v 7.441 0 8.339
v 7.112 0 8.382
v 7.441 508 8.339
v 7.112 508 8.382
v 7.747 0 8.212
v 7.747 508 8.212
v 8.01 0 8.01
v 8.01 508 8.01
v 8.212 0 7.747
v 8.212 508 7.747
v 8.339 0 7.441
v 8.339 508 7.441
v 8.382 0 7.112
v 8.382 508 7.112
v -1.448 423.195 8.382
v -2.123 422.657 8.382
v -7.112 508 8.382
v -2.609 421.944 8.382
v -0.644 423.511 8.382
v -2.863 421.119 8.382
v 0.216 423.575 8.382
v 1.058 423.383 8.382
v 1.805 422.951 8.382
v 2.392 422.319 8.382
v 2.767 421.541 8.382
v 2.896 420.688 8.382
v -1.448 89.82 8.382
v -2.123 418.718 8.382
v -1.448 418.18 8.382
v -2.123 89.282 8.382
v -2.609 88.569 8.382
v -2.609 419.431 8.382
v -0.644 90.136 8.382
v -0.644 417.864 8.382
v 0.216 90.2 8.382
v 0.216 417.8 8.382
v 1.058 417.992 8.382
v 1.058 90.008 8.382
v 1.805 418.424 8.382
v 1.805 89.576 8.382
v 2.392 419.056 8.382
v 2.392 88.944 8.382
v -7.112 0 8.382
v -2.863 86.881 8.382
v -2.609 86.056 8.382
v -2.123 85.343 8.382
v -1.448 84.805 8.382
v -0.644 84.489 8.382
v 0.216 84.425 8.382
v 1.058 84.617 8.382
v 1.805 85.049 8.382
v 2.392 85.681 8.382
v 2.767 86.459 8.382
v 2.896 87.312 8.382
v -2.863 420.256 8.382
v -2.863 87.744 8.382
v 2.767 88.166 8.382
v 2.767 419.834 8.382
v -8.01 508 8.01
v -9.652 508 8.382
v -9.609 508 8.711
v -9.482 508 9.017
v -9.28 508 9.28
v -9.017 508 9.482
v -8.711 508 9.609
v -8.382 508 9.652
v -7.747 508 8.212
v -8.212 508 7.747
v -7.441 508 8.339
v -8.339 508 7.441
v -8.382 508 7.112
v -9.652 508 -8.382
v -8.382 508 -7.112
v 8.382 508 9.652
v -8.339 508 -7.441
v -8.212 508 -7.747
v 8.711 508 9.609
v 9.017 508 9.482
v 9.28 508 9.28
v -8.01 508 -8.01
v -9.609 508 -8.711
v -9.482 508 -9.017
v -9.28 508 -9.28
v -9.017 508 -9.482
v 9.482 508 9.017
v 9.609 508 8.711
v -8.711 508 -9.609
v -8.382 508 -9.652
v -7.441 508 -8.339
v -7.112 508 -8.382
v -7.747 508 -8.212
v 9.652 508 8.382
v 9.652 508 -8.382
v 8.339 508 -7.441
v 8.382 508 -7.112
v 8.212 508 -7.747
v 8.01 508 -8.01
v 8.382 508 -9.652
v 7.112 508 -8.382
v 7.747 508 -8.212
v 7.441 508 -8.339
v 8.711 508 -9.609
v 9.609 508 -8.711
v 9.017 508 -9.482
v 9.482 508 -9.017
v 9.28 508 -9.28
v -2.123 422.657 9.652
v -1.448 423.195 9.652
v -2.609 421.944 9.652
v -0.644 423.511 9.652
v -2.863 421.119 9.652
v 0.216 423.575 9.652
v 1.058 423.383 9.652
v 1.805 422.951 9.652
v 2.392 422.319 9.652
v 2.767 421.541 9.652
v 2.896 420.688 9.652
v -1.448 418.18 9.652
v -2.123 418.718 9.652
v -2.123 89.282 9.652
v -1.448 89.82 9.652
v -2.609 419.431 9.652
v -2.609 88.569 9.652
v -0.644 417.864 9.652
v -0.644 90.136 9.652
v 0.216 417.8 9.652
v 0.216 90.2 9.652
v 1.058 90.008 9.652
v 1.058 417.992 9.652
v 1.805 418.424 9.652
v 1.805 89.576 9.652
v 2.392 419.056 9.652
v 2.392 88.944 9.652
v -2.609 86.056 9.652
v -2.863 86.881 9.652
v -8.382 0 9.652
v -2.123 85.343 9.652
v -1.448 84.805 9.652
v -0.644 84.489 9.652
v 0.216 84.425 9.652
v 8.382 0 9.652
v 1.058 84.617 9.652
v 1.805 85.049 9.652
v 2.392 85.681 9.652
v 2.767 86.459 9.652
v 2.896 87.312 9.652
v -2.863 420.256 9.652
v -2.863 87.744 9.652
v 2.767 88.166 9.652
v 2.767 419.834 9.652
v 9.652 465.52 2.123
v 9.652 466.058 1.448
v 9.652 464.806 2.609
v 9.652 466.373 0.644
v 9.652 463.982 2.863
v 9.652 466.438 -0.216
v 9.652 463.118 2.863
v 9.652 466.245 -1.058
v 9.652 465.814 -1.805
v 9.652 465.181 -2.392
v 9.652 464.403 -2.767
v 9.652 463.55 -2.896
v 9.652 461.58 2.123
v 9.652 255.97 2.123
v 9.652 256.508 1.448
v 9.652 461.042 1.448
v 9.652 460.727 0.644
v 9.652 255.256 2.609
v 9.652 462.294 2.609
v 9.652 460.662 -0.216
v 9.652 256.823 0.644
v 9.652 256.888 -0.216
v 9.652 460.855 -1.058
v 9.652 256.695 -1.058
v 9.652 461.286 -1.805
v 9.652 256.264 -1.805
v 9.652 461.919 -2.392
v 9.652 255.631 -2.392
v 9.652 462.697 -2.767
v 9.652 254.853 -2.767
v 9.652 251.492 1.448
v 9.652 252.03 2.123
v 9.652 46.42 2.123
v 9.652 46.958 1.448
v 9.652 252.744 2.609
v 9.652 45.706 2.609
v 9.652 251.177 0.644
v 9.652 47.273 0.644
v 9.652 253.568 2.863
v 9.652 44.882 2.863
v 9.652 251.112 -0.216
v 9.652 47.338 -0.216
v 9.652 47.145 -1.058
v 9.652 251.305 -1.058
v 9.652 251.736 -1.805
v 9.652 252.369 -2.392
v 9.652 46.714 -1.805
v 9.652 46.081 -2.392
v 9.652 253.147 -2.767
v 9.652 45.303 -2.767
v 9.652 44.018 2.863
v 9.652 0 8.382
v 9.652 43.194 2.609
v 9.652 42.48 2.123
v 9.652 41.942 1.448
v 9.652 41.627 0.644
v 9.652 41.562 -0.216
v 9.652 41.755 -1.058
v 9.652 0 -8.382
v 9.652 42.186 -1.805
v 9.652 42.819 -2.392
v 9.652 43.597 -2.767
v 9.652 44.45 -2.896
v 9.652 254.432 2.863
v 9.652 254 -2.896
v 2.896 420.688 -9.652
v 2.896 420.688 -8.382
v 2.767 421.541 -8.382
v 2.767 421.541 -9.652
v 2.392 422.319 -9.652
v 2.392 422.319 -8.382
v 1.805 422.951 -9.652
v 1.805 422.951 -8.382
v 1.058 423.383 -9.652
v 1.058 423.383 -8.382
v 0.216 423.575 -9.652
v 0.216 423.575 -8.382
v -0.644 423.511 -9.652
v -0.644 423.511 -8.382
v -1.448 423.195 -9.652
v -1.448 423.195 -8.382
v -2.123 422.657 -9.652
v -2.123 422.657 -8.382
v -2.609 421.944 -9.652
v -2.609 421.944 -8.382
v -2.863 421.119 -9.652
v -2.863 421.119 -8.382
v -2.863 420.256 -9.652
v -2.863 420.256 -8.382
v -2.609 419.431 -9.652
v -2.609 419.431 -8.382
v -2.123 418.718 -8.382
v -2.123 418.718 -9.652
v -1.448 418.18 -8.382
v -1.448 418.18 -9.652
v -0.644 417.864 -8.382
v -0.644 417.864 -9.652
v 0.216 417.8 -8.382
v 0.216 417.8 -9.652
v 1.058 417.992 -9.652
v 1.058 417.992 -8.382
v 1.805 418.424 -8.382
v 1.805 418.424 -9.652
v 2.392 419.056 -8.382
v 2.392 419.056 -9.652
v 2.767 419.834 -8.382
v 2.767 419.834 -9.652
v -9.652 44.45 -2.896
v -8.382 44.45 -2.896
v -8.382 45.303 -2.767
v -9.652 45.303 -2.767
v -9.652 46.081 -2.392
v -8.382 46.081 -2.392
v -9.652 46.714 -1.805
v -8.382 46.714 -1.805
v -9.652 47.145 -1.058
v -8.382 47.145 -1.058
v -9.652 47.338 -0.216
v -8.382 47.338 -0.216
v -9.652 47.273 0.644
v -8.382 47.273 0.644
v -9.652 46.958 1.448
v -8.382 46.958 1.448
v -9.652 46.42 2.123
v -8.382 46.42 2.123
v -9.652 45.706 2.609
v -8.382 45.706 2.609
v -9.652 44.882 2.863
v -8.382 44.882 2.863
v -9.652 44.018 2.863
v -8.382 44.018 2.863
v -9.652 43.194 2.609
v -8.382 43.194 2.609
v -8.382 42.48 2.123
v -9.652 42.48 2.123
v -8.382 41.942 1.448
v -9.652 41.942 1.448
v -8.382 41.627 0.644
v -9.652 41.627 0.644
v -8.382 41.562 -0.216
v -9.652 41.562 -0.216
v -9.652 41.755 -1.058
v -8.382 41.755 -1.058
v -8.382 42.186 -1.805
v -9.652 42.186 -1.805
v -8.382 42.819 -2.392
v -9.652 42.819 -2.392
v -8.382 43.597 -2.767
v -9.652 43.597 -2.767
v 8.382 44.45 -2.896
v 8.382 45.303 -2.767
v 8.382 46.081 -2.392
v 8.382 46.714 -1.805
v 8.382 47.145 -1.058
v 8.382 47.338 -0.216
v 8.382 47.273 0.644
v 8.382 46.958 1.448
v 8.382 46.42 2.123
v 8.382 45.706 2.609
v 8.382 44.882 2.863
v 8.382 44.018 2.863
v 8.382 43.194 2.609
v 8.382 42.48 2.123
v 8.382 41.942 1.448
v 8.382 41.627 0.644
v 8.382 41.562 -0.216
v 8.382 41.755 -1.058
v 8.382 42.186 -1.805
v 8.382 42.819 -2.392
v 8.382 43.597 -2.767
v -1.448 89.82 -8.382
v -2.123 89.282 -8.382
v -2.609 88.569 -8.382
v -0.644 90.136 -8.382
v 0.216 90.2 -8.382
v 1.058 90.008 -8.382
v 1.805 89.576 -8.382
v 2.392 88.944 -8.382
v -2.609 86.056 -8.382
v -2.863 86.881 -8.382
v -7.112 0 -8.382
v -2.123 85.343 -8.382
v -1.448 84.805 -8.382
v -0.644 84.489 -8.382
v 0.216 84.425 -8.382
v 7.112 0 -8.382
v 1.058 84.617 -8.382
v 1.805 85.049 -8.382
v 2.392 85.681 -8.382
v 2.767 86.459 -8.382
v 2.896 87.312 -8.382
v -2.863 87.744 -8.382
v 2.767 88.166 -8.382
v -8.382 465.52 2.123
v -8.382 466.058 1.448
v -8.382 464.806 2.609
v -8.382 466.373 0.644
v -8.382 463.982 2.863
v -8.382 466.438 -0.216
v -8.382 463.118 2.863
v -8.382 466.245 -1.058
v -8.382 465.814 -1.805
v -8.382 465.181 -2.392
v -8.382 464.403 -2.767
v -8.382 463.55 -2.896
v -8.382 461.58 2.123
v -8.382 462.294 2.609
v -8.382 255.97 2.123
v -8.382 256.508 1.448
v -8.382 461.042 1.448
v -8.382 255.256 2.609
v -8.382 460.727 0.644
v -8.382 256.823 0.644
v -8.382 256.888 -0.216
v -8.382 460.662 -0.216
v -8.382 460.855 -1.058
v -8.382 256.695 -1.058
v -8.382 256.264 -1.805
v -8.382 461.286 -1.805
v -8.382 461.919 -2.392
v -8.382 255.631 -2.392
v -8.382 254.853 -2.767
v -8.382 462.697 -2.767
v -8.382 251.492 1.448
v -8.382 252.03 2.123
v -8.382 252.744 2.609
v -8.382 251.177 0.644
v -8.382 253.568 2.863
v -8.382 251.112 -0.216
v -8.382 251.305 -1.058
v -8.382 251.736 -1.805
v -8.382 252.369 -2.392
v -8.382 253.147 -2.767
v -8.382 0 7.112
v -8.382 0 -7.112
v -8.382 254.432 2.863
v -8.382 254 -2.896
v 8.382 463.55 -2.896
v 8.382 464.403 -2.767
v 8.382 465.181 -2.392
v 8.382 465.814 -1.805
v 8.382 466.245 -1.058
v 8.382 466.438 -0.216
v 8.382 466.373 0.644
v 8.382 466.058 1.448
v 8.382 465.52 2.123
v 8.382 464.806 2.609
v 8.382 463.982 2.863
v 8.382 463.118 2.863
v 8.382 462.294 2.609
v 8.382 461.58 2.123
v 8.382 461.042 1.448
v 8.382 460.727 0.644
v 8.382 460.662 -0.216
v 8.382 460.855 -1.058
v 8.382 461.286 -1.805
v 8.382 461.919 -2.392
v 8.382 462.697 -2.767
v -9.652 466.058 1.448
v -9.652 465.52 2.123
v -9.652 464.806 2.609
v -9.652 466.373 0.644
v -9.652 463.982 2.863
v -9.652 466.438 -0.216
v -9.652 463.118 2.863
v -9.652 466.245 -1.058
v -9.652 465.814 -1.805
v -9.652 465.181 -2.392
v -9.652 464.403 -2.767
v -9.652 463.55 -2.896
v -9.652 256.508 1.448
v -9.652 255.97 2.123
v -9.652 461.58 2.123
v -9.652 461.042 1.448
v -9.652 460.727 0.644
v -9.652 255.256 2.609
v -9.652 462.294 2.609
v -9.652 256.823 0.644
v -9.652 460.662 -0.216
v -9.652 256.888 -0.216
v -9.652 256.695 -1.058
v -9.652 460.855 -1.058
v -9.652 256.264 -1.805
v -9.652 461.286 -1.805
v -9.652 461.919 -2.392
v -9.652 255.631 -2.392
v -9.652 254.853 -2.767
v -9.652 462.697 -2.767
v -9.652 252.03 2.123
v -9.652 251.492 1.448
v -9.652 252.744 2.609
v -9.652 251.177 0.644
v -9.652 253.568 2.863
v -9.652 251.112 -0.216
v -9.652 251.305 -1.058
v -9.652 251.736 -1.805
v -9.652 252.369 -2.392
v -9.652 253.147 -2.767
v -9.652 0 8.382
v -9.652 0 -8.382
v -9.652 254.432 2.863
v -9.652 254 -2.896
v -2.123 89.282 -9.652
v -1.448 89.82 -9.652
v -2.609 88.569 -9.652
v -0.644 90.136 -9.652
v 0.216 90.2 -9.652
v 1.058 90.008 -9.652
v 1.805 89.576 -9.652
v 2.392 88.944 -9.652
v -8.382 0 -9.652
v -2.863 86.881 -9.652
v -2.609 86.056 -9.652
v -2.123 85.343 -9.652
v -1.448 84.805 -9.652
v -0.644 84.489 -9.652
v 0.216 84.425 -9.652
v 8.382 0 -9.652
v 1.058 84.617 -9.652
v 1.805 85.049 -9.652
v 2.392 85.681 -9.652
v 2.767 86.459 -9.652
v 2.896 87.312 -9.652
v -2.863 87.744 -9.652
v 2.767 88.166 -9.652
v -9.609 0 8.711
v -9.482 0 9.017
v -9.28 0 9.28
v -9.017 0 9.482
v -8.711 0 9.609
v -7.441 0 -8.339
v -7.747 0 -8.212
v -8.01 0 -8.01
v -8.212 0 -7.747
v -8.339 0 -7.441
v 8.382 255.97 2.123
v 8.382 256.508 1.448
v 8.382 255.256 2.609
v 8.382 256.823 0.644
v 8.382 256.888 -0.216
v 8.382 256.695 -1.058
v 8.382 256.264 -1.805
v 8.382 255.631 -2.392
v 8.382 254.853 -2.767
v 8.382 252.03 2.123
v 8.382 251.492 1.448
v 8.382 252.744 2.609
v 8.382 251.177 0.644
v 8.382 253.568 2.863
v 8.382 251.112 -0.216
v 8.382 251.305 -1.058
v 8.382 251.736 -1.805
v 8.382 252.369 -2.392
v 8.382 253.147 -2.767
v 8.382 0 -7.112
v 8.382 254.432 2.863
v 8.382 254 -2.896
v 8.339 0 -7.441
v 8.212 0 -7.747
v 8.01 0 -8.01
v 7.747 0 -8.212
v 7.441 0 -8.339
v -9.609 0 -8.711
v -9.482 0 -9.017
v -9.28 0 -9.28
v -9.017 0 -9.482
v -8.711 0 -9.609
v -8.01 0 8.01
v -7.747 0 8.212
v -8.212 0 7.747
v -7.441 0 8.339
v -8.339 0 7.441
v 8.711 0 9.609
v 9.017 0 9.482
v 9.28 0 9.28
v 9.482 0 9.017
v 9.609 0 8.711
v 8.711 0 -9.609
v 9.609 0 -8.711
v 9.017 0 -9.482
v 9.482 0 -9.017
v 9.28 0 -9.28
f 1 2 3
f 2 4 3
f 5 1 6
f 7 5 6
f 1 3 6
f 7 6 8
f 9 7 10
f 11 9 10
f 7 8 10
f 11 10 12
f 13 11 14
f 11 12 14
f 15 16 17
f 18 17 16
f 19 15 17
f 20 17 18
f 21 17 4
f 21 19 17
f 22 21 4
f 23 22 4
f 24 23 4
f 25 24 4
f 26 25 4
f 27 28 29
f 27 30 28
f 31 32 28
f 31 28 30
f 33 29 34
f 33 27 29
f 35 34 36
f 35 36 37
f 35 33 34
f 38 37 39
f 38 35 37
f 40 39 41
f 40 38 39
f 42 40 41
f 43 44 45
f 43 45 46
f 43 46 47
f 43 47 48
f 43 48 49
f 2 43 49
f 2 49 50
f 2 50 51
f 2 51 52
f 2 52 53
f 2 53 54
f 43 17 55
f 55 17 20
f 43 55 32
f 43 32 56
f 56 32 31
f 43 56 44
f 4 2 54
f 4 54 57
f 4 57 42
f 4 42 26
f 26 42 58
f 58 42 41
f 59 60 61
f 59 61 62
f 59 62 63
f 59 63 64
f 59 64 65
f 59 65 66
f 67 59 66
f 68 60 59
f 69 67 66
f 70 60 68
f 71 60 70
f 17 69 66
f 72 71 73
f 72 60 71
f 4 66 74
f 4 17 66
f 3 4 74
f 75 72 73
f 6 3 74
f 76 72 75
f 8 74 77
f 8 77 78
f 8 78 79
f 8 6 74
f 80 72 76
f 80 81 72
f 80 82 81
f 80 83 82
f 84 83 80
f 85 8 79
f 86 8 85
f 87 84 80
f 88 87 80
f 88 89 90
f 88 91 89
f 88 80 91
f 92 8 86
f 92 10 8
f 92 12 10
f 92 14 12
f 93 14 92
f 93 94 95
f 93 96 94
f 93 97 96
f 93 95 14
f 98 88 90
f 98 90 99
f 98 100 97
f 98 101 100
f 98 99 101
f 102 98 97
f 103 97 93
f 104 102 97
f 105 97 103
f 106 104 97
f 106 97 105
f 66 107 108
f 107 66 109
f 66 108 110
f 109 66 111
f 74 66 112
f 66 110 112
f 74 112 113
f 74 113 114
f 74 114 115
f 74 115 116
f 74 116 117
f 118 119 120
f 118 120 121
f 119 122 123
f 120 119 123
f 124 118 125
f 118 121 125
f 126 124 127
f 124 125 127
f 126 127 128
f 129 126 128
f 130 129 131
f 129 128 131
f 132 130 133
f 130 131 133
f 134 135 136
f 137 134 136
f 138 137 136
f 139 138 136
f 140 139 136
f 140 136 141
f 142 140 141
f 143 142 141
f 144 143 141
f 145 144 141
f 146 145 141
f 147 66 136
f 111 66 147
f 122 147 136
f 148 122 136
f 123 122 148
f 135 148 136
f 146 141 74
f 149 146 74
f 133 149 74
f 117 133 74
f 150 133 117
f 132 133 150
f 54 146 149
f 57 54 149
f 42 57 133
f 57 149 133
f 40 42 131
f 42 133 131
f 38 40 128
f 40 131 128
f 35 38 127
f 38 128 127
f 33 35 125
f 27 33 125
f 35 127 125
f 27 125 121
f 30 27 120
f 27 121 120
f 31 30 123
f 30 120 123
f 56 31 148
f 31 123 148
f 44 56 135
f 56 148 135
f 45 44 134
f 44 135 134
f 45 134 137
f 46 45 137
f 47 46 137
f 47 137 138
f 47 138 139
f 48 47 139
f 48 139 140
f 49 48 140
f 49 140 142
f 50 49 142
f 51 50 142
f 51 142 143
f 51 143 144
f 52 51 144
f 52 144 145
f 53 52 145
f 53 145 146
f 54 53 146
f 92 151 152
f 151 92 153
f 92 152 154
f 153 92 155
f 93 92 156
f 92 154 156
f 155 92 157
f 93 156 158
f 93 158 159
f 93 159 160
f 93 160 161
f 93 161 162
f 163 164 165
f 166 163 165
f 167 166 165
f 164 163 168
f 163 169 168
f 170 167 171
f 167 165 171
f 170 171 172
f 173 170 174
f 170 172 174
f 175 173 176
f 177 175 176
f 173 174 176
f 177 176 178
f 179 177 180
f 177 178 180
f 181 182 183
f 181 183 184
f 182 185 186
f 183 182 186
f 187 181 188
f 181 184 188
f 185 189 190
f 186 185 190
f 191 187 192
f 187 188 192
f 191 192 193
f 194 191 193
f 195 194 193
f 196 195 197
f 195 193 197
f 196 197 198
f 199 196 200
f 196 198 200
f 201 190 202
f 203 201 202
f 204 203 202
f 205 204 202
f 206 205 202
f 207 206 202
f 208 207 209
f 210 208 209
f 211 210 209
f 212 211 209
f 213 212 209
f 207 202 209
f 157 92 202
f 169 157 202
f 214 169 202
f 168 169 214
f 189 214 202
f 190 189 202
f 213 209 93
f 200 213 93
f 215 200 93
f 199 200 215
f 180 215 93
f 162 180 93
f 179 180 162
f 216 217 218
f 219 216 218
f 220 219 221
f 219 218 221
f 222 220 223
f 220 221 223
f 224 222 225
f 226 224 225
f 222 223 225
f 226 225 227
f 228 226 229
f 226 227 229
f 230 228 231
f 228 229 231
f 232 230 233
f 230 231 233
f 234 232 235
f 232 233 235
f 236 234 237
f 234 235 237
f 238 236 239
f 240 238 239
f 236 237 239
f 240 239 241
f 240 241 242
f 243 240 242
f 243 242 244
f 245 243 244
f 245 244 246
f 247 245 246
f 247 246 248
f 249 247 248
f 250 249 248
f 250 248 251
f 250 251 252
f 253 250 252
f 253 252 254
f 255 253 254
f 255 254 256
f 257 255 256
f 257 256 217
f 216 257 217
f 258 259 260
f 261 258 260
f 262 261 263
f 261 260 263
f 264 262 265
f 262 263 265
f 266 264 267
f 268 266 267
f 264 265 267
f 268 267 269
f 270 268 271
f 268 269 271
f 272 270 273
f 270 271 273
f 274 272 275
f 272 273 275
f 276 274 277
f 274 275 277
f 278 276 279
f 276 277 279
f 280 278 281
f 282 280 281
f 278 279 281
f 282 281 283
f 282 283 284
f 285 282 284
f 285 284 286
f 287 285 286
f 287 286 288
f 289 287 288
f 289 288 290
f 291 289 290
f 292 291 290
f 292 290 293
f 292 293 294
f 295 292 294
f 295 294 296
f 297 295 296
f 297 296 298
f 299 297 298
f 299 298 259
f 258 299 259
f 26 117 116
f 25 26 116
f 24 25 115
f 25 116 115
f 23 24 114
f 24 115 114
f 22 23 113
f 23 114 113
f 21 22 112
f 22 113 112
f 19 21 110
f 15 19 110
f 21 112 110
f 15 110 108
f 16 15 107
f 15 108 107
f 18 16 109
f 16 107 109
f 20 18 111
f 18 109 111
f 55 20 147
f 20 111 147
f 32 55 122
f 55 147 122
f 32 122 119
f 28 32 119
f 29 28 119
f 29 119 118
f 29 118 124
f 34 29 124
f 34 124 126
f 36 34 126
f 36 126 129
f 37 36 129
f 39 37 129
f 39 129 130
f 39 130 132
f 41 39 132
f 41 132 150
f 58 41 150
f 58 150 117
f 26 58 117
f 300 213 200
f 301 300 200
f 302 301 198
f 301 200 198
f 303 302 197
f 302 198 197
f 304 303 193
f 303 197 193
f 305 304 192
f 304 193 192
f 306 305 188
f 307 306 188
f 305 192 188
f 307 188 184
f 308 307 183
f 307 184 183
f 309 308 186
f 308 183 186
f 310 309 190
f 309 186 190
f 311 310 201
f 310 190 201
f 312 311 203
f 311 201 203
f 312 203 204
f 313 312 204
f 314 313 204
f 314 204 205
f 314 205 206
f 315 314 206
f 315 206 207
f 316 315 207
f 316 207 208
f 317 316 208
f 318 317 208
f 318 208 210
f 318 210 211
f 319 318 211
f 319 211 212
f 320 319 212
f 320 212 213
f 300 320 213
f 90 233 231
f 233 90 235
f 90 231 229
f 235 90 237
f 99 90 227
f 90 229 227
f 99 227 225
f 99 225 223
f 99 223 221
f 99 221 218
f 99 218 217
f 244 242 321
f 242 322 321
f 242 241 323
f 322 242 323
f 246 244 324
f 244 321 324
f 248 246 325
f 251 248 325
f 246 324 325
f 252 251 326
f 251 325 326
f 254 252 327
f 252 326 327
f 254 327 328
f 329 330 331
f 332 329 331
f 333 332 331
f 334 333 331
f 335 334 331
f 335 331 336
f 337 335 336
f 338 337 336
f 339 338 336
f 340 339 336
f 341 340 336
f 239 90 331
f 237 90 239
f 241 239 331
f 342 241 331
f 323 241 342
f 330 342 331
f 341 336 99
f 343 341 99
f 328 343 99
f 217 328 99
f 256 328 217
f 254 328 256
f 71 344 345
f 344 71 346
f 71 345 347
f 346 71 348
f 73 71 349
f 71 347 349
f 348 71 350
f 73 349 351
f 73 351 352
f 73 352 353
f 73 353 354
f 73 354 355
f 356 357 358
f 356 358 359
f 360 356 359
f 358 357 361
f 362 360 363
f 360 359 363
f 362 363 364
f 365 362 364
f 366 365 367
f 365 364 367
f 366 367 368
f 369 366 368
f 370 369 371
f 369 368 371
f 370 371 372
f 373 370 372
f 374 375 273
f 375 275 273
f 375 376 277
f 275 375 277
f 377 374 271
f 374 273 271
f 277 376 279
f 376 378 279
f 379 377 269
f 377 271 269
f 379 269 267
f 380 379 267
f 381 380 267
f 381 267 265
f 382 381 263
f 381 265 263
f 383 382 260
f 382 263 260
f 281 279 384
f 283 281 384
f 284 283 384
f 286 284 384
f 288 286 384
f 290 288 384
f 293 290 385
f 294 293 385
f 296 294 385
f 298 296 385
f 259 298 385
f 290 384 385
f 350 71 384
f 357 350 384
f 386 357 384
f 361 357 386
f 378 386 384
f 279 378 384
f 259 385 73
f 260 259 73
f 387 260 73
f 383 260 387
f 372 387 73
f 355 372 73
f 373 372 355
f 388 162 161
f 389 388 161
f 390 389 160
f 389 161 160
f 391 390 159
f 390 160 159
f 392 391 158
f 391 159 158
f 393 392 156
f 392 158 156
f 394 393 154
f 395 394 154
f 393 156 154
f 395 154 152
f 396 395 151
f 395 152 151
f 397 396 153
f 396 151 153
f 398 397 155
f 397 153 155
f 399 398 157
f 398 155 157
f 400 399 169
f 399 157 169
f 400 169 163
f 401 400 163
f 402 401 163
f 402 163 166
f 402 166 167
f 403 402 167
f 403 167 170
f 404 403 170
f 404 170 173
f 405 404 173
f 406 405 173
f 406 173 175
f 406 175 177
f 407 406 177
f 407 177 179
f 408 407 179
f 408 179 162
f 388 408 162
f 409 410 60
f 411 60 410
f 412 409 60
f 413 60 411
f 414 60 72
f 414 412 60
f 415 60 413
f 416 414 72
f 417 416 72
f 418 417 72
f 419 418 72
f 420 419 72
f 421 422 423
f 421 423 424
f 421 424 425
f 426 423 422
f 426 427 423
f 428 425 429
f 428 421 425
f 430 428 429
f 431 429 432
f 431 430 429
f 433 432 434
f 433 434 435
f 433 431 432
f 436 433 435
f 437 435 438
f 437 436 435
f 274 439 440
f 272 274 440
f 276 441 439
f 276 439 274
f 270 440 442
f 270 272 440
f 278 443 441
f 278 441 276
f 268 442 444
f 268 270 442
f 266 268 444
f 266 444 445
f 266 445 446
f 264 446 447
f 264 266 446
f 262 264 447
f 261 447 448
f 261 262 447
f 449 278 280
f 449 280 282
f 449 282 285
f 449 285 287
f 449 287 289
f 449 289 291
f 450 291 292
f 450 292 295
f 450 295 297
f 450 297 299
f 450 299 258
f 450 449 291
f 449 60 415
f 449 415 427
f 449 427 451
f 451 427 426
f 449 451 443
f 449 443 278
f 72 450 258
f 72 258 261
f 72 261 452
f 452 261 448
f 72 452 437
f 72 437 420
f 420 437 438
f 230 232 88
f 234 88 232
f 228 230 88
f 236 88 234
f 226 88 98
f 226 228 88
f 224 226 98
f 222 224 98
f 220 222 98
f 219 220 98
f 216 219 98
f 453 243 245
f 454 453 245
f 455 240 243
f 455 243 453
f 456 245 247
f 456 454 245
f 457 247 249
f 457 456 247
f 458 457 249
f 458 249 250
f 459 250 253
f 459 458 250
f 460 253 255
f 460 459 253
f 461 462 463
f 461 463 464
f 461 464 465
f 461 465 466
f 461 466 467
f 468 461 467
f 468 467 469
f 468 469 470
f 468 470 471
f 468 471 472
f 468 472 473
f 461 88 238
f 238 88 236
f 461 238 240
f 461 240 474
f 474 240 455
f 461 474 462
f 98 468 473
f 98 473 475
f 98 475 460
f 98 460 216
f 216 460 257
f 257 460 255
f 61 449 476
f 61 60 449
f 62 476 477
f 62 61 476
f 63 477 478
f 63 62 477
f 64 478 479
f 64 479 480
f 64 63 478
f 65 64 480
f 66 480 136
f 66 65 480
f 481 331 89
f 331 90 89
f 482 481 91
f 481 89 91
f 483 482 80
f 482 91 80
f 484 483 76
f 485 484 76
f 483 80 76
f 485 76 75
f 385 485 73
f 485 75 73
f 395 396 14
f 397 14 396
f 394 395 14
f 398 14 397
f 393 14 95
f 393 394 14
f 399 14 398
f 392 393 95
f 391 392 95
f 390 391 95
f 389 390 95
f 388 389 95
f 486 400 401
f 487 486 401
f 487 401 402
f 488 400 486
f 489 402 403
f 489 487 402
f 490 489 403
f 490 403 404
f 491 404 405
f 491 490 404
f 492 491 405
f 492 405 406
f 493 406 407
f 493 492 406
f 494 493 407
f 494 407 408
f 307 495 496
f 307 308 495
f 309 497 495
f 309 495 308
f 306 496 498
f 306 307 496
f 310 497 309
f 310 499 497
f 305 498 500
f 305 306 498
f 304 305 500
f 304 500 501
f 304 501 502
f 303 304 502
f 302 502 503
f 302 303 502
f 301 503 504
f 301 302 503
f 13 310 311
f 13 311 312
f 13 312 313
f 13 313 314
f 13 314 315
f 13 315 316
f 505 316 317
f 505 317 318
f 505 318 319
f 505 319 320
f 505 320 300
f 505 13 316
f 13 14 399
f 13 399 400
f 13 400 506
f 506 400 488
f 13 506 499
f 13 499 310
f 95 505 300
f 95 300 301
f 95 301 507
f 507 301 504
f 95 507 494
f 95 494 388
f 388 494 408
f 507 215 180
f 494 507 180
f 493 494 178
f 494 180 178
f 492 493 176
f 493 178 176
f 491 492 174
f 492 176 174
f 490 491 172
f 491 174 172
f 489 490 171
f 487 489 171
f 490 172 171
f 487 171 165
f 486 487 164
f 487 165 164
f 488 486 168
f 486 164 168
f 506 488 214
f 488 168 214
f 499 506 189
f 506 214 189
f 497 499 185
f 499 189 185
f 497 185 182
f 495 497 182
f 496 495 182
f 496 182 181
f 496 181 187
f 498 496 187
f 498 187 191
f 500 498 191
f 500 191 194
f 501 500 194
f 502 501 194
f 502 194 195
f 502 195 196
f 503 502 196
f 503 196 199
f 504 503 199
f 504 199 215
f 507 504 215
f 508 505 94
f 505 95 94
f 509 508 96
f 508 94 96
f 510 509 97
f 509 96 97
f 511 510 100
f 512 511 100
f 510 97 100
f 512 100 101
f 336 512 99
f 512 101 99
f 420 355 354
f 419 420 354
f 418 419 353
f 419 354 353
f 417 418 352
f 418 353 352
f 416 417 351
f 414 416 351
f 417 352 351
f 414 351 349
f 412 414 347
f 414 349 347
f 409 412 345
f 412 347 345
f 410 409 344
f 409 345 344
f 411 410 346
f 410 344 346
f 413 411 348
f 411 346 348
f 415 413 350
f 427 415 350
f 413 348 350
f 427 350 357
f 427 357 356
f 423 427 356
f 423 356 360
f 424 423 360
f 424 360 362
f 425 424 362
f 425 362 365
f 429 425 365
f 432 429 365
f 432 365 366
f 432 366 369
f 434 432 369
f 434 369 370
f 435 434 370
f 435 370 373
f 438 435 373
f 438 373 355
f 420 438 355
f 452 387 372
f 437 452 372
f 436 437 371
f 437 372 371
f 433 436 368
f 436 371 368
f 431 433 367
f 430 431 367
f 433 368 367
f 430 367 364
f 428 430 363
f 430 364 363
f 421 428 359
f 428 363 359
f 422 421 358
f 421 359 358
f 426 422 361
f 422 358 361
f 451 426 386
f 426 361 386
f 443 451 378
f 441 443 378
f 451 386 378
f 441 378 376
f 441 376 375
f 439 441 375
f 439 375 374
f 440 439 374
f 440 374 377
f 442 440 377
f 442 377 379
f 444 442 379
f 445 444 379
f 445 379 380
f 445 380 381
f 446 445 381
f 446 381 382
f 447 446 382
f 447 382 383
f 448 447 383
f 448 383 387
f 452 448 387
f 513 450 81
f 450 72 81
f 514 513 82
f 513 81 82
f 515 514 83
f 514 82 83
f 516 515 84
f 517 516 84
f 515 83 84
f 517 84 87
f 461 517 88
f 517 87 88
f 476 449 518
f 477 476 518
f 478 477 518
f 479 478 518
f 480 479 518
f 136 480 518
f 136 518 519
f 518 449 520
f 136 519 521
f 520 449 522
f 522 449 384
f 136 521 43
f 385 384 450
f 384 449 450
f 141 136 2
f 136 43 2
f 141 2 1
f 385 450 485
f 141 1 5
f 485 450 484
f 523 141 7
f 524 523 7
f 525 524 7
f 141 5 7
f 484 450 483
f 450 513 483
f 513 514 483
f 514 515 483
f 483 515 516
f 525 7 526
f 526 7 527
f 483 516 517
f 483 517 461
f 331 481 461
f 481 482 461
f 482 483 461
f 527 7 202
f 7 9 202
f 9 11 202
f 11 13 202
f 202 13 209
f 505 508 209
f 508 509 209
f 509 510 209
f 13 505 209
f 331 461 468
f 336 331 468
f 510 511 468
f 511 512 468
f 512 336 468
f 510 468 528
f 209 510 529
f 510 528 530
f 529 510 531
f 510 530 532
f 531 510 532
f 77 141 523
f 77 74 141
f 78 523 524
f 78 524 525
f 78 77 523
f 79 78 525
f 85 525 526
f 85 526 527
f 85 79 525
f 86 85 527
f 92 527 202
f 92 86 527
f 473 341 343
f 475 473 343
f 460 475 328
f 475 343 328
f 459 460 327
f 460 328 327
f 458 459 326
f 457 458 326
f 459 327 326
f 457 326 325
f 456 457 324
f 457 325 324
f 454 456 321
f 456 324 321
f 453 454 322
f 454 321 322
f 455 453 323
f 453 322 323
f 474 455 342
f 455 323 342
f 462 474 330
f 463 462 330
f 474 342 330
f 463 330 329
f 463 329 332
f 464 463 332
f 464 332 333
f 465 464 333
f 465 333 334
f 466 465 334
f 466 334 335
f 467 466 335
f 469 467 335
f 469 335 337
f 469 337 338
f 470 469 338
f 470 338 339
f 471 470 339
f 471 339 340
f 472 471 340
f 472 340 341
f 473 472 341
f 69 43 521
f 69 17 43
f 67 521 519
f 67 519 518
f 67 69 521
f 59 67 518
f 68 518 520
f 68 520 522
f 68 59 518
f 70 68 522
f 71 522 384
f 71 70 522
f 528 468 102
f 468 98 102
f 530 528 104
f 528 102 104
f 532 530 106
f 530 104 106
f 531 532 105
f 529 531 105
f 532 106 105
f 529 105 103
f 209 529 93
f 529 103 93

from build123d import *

# Parameters (mm, degrees)
SKETCH1_W                  = 19.304
SKETCH1_H                  = 19.304
SKETCH1_W_2                = 16.764
SKETCH1_H_2                = 16.764
BOSS_EXTRUDE1_DEPTH        = 508
FILLET1_R                  = 1.27
F_1_0_228_DIAMETER_HOLE2_D = 5.7912
F_1_0_228_DIAMETER_HOLE3_D = 5.7912


with BuildPart() as part:
    # Sketch1 → Boss-Extrude1 (new body)
    with BuildSketch(Plane(origin=(0, 0, 0), x_dir=(1, 0, 0), z_dir=(0, 1, 0))):
        Rectangle(SKETCH1_W, SKETCH1_H)
        Rectangle(SKETCH1_W_2, SKETCH1_H_2, mode=Mode.SUBTRACT)
    extrude(amount=BOSS_EXTRUDE1_DEPTH)

    # Fillet1
    fillet1_edges = [part.edges().sort_by_distance(p)[0] for p in [
        (-8.382, 254, 8.382),
        (8.382, 254, 8.382),
        (8.382, 254, -8.382),
        (-8.382, 254, -8.382),
        (9.652, 254, 9.652),
        (-9.652, 254, 9.652),
        (-9.652, 254, -9.652),
        (9.652, 254, -9.652),
    ]]
    fillet(fillet1_edges, radius=FILLET1_R)

    # #1 (0.228) Diameter Hole2 (through all)
    with Locations(Plane.ZY.offset(9.652)):
        with Locations((0, 463.55), (0, 44.45), (0, 254)):
            Hole(F_1_0_228_DIAMETER_HOLE2_D / 2)

    # #1 (0.228) Diameter Hole3 (through all)
    with Locations(Plane(origin=(0, 0, -9.652), x_dir=(-1, 0, 0), z_dir=(0, 0, -1))):
        with Locations((0, 420.6875), (0, 87.3125)):
            Hole(F_1_0_228_DIAMETER_HOLE3_D / 2)


solid = part.part
